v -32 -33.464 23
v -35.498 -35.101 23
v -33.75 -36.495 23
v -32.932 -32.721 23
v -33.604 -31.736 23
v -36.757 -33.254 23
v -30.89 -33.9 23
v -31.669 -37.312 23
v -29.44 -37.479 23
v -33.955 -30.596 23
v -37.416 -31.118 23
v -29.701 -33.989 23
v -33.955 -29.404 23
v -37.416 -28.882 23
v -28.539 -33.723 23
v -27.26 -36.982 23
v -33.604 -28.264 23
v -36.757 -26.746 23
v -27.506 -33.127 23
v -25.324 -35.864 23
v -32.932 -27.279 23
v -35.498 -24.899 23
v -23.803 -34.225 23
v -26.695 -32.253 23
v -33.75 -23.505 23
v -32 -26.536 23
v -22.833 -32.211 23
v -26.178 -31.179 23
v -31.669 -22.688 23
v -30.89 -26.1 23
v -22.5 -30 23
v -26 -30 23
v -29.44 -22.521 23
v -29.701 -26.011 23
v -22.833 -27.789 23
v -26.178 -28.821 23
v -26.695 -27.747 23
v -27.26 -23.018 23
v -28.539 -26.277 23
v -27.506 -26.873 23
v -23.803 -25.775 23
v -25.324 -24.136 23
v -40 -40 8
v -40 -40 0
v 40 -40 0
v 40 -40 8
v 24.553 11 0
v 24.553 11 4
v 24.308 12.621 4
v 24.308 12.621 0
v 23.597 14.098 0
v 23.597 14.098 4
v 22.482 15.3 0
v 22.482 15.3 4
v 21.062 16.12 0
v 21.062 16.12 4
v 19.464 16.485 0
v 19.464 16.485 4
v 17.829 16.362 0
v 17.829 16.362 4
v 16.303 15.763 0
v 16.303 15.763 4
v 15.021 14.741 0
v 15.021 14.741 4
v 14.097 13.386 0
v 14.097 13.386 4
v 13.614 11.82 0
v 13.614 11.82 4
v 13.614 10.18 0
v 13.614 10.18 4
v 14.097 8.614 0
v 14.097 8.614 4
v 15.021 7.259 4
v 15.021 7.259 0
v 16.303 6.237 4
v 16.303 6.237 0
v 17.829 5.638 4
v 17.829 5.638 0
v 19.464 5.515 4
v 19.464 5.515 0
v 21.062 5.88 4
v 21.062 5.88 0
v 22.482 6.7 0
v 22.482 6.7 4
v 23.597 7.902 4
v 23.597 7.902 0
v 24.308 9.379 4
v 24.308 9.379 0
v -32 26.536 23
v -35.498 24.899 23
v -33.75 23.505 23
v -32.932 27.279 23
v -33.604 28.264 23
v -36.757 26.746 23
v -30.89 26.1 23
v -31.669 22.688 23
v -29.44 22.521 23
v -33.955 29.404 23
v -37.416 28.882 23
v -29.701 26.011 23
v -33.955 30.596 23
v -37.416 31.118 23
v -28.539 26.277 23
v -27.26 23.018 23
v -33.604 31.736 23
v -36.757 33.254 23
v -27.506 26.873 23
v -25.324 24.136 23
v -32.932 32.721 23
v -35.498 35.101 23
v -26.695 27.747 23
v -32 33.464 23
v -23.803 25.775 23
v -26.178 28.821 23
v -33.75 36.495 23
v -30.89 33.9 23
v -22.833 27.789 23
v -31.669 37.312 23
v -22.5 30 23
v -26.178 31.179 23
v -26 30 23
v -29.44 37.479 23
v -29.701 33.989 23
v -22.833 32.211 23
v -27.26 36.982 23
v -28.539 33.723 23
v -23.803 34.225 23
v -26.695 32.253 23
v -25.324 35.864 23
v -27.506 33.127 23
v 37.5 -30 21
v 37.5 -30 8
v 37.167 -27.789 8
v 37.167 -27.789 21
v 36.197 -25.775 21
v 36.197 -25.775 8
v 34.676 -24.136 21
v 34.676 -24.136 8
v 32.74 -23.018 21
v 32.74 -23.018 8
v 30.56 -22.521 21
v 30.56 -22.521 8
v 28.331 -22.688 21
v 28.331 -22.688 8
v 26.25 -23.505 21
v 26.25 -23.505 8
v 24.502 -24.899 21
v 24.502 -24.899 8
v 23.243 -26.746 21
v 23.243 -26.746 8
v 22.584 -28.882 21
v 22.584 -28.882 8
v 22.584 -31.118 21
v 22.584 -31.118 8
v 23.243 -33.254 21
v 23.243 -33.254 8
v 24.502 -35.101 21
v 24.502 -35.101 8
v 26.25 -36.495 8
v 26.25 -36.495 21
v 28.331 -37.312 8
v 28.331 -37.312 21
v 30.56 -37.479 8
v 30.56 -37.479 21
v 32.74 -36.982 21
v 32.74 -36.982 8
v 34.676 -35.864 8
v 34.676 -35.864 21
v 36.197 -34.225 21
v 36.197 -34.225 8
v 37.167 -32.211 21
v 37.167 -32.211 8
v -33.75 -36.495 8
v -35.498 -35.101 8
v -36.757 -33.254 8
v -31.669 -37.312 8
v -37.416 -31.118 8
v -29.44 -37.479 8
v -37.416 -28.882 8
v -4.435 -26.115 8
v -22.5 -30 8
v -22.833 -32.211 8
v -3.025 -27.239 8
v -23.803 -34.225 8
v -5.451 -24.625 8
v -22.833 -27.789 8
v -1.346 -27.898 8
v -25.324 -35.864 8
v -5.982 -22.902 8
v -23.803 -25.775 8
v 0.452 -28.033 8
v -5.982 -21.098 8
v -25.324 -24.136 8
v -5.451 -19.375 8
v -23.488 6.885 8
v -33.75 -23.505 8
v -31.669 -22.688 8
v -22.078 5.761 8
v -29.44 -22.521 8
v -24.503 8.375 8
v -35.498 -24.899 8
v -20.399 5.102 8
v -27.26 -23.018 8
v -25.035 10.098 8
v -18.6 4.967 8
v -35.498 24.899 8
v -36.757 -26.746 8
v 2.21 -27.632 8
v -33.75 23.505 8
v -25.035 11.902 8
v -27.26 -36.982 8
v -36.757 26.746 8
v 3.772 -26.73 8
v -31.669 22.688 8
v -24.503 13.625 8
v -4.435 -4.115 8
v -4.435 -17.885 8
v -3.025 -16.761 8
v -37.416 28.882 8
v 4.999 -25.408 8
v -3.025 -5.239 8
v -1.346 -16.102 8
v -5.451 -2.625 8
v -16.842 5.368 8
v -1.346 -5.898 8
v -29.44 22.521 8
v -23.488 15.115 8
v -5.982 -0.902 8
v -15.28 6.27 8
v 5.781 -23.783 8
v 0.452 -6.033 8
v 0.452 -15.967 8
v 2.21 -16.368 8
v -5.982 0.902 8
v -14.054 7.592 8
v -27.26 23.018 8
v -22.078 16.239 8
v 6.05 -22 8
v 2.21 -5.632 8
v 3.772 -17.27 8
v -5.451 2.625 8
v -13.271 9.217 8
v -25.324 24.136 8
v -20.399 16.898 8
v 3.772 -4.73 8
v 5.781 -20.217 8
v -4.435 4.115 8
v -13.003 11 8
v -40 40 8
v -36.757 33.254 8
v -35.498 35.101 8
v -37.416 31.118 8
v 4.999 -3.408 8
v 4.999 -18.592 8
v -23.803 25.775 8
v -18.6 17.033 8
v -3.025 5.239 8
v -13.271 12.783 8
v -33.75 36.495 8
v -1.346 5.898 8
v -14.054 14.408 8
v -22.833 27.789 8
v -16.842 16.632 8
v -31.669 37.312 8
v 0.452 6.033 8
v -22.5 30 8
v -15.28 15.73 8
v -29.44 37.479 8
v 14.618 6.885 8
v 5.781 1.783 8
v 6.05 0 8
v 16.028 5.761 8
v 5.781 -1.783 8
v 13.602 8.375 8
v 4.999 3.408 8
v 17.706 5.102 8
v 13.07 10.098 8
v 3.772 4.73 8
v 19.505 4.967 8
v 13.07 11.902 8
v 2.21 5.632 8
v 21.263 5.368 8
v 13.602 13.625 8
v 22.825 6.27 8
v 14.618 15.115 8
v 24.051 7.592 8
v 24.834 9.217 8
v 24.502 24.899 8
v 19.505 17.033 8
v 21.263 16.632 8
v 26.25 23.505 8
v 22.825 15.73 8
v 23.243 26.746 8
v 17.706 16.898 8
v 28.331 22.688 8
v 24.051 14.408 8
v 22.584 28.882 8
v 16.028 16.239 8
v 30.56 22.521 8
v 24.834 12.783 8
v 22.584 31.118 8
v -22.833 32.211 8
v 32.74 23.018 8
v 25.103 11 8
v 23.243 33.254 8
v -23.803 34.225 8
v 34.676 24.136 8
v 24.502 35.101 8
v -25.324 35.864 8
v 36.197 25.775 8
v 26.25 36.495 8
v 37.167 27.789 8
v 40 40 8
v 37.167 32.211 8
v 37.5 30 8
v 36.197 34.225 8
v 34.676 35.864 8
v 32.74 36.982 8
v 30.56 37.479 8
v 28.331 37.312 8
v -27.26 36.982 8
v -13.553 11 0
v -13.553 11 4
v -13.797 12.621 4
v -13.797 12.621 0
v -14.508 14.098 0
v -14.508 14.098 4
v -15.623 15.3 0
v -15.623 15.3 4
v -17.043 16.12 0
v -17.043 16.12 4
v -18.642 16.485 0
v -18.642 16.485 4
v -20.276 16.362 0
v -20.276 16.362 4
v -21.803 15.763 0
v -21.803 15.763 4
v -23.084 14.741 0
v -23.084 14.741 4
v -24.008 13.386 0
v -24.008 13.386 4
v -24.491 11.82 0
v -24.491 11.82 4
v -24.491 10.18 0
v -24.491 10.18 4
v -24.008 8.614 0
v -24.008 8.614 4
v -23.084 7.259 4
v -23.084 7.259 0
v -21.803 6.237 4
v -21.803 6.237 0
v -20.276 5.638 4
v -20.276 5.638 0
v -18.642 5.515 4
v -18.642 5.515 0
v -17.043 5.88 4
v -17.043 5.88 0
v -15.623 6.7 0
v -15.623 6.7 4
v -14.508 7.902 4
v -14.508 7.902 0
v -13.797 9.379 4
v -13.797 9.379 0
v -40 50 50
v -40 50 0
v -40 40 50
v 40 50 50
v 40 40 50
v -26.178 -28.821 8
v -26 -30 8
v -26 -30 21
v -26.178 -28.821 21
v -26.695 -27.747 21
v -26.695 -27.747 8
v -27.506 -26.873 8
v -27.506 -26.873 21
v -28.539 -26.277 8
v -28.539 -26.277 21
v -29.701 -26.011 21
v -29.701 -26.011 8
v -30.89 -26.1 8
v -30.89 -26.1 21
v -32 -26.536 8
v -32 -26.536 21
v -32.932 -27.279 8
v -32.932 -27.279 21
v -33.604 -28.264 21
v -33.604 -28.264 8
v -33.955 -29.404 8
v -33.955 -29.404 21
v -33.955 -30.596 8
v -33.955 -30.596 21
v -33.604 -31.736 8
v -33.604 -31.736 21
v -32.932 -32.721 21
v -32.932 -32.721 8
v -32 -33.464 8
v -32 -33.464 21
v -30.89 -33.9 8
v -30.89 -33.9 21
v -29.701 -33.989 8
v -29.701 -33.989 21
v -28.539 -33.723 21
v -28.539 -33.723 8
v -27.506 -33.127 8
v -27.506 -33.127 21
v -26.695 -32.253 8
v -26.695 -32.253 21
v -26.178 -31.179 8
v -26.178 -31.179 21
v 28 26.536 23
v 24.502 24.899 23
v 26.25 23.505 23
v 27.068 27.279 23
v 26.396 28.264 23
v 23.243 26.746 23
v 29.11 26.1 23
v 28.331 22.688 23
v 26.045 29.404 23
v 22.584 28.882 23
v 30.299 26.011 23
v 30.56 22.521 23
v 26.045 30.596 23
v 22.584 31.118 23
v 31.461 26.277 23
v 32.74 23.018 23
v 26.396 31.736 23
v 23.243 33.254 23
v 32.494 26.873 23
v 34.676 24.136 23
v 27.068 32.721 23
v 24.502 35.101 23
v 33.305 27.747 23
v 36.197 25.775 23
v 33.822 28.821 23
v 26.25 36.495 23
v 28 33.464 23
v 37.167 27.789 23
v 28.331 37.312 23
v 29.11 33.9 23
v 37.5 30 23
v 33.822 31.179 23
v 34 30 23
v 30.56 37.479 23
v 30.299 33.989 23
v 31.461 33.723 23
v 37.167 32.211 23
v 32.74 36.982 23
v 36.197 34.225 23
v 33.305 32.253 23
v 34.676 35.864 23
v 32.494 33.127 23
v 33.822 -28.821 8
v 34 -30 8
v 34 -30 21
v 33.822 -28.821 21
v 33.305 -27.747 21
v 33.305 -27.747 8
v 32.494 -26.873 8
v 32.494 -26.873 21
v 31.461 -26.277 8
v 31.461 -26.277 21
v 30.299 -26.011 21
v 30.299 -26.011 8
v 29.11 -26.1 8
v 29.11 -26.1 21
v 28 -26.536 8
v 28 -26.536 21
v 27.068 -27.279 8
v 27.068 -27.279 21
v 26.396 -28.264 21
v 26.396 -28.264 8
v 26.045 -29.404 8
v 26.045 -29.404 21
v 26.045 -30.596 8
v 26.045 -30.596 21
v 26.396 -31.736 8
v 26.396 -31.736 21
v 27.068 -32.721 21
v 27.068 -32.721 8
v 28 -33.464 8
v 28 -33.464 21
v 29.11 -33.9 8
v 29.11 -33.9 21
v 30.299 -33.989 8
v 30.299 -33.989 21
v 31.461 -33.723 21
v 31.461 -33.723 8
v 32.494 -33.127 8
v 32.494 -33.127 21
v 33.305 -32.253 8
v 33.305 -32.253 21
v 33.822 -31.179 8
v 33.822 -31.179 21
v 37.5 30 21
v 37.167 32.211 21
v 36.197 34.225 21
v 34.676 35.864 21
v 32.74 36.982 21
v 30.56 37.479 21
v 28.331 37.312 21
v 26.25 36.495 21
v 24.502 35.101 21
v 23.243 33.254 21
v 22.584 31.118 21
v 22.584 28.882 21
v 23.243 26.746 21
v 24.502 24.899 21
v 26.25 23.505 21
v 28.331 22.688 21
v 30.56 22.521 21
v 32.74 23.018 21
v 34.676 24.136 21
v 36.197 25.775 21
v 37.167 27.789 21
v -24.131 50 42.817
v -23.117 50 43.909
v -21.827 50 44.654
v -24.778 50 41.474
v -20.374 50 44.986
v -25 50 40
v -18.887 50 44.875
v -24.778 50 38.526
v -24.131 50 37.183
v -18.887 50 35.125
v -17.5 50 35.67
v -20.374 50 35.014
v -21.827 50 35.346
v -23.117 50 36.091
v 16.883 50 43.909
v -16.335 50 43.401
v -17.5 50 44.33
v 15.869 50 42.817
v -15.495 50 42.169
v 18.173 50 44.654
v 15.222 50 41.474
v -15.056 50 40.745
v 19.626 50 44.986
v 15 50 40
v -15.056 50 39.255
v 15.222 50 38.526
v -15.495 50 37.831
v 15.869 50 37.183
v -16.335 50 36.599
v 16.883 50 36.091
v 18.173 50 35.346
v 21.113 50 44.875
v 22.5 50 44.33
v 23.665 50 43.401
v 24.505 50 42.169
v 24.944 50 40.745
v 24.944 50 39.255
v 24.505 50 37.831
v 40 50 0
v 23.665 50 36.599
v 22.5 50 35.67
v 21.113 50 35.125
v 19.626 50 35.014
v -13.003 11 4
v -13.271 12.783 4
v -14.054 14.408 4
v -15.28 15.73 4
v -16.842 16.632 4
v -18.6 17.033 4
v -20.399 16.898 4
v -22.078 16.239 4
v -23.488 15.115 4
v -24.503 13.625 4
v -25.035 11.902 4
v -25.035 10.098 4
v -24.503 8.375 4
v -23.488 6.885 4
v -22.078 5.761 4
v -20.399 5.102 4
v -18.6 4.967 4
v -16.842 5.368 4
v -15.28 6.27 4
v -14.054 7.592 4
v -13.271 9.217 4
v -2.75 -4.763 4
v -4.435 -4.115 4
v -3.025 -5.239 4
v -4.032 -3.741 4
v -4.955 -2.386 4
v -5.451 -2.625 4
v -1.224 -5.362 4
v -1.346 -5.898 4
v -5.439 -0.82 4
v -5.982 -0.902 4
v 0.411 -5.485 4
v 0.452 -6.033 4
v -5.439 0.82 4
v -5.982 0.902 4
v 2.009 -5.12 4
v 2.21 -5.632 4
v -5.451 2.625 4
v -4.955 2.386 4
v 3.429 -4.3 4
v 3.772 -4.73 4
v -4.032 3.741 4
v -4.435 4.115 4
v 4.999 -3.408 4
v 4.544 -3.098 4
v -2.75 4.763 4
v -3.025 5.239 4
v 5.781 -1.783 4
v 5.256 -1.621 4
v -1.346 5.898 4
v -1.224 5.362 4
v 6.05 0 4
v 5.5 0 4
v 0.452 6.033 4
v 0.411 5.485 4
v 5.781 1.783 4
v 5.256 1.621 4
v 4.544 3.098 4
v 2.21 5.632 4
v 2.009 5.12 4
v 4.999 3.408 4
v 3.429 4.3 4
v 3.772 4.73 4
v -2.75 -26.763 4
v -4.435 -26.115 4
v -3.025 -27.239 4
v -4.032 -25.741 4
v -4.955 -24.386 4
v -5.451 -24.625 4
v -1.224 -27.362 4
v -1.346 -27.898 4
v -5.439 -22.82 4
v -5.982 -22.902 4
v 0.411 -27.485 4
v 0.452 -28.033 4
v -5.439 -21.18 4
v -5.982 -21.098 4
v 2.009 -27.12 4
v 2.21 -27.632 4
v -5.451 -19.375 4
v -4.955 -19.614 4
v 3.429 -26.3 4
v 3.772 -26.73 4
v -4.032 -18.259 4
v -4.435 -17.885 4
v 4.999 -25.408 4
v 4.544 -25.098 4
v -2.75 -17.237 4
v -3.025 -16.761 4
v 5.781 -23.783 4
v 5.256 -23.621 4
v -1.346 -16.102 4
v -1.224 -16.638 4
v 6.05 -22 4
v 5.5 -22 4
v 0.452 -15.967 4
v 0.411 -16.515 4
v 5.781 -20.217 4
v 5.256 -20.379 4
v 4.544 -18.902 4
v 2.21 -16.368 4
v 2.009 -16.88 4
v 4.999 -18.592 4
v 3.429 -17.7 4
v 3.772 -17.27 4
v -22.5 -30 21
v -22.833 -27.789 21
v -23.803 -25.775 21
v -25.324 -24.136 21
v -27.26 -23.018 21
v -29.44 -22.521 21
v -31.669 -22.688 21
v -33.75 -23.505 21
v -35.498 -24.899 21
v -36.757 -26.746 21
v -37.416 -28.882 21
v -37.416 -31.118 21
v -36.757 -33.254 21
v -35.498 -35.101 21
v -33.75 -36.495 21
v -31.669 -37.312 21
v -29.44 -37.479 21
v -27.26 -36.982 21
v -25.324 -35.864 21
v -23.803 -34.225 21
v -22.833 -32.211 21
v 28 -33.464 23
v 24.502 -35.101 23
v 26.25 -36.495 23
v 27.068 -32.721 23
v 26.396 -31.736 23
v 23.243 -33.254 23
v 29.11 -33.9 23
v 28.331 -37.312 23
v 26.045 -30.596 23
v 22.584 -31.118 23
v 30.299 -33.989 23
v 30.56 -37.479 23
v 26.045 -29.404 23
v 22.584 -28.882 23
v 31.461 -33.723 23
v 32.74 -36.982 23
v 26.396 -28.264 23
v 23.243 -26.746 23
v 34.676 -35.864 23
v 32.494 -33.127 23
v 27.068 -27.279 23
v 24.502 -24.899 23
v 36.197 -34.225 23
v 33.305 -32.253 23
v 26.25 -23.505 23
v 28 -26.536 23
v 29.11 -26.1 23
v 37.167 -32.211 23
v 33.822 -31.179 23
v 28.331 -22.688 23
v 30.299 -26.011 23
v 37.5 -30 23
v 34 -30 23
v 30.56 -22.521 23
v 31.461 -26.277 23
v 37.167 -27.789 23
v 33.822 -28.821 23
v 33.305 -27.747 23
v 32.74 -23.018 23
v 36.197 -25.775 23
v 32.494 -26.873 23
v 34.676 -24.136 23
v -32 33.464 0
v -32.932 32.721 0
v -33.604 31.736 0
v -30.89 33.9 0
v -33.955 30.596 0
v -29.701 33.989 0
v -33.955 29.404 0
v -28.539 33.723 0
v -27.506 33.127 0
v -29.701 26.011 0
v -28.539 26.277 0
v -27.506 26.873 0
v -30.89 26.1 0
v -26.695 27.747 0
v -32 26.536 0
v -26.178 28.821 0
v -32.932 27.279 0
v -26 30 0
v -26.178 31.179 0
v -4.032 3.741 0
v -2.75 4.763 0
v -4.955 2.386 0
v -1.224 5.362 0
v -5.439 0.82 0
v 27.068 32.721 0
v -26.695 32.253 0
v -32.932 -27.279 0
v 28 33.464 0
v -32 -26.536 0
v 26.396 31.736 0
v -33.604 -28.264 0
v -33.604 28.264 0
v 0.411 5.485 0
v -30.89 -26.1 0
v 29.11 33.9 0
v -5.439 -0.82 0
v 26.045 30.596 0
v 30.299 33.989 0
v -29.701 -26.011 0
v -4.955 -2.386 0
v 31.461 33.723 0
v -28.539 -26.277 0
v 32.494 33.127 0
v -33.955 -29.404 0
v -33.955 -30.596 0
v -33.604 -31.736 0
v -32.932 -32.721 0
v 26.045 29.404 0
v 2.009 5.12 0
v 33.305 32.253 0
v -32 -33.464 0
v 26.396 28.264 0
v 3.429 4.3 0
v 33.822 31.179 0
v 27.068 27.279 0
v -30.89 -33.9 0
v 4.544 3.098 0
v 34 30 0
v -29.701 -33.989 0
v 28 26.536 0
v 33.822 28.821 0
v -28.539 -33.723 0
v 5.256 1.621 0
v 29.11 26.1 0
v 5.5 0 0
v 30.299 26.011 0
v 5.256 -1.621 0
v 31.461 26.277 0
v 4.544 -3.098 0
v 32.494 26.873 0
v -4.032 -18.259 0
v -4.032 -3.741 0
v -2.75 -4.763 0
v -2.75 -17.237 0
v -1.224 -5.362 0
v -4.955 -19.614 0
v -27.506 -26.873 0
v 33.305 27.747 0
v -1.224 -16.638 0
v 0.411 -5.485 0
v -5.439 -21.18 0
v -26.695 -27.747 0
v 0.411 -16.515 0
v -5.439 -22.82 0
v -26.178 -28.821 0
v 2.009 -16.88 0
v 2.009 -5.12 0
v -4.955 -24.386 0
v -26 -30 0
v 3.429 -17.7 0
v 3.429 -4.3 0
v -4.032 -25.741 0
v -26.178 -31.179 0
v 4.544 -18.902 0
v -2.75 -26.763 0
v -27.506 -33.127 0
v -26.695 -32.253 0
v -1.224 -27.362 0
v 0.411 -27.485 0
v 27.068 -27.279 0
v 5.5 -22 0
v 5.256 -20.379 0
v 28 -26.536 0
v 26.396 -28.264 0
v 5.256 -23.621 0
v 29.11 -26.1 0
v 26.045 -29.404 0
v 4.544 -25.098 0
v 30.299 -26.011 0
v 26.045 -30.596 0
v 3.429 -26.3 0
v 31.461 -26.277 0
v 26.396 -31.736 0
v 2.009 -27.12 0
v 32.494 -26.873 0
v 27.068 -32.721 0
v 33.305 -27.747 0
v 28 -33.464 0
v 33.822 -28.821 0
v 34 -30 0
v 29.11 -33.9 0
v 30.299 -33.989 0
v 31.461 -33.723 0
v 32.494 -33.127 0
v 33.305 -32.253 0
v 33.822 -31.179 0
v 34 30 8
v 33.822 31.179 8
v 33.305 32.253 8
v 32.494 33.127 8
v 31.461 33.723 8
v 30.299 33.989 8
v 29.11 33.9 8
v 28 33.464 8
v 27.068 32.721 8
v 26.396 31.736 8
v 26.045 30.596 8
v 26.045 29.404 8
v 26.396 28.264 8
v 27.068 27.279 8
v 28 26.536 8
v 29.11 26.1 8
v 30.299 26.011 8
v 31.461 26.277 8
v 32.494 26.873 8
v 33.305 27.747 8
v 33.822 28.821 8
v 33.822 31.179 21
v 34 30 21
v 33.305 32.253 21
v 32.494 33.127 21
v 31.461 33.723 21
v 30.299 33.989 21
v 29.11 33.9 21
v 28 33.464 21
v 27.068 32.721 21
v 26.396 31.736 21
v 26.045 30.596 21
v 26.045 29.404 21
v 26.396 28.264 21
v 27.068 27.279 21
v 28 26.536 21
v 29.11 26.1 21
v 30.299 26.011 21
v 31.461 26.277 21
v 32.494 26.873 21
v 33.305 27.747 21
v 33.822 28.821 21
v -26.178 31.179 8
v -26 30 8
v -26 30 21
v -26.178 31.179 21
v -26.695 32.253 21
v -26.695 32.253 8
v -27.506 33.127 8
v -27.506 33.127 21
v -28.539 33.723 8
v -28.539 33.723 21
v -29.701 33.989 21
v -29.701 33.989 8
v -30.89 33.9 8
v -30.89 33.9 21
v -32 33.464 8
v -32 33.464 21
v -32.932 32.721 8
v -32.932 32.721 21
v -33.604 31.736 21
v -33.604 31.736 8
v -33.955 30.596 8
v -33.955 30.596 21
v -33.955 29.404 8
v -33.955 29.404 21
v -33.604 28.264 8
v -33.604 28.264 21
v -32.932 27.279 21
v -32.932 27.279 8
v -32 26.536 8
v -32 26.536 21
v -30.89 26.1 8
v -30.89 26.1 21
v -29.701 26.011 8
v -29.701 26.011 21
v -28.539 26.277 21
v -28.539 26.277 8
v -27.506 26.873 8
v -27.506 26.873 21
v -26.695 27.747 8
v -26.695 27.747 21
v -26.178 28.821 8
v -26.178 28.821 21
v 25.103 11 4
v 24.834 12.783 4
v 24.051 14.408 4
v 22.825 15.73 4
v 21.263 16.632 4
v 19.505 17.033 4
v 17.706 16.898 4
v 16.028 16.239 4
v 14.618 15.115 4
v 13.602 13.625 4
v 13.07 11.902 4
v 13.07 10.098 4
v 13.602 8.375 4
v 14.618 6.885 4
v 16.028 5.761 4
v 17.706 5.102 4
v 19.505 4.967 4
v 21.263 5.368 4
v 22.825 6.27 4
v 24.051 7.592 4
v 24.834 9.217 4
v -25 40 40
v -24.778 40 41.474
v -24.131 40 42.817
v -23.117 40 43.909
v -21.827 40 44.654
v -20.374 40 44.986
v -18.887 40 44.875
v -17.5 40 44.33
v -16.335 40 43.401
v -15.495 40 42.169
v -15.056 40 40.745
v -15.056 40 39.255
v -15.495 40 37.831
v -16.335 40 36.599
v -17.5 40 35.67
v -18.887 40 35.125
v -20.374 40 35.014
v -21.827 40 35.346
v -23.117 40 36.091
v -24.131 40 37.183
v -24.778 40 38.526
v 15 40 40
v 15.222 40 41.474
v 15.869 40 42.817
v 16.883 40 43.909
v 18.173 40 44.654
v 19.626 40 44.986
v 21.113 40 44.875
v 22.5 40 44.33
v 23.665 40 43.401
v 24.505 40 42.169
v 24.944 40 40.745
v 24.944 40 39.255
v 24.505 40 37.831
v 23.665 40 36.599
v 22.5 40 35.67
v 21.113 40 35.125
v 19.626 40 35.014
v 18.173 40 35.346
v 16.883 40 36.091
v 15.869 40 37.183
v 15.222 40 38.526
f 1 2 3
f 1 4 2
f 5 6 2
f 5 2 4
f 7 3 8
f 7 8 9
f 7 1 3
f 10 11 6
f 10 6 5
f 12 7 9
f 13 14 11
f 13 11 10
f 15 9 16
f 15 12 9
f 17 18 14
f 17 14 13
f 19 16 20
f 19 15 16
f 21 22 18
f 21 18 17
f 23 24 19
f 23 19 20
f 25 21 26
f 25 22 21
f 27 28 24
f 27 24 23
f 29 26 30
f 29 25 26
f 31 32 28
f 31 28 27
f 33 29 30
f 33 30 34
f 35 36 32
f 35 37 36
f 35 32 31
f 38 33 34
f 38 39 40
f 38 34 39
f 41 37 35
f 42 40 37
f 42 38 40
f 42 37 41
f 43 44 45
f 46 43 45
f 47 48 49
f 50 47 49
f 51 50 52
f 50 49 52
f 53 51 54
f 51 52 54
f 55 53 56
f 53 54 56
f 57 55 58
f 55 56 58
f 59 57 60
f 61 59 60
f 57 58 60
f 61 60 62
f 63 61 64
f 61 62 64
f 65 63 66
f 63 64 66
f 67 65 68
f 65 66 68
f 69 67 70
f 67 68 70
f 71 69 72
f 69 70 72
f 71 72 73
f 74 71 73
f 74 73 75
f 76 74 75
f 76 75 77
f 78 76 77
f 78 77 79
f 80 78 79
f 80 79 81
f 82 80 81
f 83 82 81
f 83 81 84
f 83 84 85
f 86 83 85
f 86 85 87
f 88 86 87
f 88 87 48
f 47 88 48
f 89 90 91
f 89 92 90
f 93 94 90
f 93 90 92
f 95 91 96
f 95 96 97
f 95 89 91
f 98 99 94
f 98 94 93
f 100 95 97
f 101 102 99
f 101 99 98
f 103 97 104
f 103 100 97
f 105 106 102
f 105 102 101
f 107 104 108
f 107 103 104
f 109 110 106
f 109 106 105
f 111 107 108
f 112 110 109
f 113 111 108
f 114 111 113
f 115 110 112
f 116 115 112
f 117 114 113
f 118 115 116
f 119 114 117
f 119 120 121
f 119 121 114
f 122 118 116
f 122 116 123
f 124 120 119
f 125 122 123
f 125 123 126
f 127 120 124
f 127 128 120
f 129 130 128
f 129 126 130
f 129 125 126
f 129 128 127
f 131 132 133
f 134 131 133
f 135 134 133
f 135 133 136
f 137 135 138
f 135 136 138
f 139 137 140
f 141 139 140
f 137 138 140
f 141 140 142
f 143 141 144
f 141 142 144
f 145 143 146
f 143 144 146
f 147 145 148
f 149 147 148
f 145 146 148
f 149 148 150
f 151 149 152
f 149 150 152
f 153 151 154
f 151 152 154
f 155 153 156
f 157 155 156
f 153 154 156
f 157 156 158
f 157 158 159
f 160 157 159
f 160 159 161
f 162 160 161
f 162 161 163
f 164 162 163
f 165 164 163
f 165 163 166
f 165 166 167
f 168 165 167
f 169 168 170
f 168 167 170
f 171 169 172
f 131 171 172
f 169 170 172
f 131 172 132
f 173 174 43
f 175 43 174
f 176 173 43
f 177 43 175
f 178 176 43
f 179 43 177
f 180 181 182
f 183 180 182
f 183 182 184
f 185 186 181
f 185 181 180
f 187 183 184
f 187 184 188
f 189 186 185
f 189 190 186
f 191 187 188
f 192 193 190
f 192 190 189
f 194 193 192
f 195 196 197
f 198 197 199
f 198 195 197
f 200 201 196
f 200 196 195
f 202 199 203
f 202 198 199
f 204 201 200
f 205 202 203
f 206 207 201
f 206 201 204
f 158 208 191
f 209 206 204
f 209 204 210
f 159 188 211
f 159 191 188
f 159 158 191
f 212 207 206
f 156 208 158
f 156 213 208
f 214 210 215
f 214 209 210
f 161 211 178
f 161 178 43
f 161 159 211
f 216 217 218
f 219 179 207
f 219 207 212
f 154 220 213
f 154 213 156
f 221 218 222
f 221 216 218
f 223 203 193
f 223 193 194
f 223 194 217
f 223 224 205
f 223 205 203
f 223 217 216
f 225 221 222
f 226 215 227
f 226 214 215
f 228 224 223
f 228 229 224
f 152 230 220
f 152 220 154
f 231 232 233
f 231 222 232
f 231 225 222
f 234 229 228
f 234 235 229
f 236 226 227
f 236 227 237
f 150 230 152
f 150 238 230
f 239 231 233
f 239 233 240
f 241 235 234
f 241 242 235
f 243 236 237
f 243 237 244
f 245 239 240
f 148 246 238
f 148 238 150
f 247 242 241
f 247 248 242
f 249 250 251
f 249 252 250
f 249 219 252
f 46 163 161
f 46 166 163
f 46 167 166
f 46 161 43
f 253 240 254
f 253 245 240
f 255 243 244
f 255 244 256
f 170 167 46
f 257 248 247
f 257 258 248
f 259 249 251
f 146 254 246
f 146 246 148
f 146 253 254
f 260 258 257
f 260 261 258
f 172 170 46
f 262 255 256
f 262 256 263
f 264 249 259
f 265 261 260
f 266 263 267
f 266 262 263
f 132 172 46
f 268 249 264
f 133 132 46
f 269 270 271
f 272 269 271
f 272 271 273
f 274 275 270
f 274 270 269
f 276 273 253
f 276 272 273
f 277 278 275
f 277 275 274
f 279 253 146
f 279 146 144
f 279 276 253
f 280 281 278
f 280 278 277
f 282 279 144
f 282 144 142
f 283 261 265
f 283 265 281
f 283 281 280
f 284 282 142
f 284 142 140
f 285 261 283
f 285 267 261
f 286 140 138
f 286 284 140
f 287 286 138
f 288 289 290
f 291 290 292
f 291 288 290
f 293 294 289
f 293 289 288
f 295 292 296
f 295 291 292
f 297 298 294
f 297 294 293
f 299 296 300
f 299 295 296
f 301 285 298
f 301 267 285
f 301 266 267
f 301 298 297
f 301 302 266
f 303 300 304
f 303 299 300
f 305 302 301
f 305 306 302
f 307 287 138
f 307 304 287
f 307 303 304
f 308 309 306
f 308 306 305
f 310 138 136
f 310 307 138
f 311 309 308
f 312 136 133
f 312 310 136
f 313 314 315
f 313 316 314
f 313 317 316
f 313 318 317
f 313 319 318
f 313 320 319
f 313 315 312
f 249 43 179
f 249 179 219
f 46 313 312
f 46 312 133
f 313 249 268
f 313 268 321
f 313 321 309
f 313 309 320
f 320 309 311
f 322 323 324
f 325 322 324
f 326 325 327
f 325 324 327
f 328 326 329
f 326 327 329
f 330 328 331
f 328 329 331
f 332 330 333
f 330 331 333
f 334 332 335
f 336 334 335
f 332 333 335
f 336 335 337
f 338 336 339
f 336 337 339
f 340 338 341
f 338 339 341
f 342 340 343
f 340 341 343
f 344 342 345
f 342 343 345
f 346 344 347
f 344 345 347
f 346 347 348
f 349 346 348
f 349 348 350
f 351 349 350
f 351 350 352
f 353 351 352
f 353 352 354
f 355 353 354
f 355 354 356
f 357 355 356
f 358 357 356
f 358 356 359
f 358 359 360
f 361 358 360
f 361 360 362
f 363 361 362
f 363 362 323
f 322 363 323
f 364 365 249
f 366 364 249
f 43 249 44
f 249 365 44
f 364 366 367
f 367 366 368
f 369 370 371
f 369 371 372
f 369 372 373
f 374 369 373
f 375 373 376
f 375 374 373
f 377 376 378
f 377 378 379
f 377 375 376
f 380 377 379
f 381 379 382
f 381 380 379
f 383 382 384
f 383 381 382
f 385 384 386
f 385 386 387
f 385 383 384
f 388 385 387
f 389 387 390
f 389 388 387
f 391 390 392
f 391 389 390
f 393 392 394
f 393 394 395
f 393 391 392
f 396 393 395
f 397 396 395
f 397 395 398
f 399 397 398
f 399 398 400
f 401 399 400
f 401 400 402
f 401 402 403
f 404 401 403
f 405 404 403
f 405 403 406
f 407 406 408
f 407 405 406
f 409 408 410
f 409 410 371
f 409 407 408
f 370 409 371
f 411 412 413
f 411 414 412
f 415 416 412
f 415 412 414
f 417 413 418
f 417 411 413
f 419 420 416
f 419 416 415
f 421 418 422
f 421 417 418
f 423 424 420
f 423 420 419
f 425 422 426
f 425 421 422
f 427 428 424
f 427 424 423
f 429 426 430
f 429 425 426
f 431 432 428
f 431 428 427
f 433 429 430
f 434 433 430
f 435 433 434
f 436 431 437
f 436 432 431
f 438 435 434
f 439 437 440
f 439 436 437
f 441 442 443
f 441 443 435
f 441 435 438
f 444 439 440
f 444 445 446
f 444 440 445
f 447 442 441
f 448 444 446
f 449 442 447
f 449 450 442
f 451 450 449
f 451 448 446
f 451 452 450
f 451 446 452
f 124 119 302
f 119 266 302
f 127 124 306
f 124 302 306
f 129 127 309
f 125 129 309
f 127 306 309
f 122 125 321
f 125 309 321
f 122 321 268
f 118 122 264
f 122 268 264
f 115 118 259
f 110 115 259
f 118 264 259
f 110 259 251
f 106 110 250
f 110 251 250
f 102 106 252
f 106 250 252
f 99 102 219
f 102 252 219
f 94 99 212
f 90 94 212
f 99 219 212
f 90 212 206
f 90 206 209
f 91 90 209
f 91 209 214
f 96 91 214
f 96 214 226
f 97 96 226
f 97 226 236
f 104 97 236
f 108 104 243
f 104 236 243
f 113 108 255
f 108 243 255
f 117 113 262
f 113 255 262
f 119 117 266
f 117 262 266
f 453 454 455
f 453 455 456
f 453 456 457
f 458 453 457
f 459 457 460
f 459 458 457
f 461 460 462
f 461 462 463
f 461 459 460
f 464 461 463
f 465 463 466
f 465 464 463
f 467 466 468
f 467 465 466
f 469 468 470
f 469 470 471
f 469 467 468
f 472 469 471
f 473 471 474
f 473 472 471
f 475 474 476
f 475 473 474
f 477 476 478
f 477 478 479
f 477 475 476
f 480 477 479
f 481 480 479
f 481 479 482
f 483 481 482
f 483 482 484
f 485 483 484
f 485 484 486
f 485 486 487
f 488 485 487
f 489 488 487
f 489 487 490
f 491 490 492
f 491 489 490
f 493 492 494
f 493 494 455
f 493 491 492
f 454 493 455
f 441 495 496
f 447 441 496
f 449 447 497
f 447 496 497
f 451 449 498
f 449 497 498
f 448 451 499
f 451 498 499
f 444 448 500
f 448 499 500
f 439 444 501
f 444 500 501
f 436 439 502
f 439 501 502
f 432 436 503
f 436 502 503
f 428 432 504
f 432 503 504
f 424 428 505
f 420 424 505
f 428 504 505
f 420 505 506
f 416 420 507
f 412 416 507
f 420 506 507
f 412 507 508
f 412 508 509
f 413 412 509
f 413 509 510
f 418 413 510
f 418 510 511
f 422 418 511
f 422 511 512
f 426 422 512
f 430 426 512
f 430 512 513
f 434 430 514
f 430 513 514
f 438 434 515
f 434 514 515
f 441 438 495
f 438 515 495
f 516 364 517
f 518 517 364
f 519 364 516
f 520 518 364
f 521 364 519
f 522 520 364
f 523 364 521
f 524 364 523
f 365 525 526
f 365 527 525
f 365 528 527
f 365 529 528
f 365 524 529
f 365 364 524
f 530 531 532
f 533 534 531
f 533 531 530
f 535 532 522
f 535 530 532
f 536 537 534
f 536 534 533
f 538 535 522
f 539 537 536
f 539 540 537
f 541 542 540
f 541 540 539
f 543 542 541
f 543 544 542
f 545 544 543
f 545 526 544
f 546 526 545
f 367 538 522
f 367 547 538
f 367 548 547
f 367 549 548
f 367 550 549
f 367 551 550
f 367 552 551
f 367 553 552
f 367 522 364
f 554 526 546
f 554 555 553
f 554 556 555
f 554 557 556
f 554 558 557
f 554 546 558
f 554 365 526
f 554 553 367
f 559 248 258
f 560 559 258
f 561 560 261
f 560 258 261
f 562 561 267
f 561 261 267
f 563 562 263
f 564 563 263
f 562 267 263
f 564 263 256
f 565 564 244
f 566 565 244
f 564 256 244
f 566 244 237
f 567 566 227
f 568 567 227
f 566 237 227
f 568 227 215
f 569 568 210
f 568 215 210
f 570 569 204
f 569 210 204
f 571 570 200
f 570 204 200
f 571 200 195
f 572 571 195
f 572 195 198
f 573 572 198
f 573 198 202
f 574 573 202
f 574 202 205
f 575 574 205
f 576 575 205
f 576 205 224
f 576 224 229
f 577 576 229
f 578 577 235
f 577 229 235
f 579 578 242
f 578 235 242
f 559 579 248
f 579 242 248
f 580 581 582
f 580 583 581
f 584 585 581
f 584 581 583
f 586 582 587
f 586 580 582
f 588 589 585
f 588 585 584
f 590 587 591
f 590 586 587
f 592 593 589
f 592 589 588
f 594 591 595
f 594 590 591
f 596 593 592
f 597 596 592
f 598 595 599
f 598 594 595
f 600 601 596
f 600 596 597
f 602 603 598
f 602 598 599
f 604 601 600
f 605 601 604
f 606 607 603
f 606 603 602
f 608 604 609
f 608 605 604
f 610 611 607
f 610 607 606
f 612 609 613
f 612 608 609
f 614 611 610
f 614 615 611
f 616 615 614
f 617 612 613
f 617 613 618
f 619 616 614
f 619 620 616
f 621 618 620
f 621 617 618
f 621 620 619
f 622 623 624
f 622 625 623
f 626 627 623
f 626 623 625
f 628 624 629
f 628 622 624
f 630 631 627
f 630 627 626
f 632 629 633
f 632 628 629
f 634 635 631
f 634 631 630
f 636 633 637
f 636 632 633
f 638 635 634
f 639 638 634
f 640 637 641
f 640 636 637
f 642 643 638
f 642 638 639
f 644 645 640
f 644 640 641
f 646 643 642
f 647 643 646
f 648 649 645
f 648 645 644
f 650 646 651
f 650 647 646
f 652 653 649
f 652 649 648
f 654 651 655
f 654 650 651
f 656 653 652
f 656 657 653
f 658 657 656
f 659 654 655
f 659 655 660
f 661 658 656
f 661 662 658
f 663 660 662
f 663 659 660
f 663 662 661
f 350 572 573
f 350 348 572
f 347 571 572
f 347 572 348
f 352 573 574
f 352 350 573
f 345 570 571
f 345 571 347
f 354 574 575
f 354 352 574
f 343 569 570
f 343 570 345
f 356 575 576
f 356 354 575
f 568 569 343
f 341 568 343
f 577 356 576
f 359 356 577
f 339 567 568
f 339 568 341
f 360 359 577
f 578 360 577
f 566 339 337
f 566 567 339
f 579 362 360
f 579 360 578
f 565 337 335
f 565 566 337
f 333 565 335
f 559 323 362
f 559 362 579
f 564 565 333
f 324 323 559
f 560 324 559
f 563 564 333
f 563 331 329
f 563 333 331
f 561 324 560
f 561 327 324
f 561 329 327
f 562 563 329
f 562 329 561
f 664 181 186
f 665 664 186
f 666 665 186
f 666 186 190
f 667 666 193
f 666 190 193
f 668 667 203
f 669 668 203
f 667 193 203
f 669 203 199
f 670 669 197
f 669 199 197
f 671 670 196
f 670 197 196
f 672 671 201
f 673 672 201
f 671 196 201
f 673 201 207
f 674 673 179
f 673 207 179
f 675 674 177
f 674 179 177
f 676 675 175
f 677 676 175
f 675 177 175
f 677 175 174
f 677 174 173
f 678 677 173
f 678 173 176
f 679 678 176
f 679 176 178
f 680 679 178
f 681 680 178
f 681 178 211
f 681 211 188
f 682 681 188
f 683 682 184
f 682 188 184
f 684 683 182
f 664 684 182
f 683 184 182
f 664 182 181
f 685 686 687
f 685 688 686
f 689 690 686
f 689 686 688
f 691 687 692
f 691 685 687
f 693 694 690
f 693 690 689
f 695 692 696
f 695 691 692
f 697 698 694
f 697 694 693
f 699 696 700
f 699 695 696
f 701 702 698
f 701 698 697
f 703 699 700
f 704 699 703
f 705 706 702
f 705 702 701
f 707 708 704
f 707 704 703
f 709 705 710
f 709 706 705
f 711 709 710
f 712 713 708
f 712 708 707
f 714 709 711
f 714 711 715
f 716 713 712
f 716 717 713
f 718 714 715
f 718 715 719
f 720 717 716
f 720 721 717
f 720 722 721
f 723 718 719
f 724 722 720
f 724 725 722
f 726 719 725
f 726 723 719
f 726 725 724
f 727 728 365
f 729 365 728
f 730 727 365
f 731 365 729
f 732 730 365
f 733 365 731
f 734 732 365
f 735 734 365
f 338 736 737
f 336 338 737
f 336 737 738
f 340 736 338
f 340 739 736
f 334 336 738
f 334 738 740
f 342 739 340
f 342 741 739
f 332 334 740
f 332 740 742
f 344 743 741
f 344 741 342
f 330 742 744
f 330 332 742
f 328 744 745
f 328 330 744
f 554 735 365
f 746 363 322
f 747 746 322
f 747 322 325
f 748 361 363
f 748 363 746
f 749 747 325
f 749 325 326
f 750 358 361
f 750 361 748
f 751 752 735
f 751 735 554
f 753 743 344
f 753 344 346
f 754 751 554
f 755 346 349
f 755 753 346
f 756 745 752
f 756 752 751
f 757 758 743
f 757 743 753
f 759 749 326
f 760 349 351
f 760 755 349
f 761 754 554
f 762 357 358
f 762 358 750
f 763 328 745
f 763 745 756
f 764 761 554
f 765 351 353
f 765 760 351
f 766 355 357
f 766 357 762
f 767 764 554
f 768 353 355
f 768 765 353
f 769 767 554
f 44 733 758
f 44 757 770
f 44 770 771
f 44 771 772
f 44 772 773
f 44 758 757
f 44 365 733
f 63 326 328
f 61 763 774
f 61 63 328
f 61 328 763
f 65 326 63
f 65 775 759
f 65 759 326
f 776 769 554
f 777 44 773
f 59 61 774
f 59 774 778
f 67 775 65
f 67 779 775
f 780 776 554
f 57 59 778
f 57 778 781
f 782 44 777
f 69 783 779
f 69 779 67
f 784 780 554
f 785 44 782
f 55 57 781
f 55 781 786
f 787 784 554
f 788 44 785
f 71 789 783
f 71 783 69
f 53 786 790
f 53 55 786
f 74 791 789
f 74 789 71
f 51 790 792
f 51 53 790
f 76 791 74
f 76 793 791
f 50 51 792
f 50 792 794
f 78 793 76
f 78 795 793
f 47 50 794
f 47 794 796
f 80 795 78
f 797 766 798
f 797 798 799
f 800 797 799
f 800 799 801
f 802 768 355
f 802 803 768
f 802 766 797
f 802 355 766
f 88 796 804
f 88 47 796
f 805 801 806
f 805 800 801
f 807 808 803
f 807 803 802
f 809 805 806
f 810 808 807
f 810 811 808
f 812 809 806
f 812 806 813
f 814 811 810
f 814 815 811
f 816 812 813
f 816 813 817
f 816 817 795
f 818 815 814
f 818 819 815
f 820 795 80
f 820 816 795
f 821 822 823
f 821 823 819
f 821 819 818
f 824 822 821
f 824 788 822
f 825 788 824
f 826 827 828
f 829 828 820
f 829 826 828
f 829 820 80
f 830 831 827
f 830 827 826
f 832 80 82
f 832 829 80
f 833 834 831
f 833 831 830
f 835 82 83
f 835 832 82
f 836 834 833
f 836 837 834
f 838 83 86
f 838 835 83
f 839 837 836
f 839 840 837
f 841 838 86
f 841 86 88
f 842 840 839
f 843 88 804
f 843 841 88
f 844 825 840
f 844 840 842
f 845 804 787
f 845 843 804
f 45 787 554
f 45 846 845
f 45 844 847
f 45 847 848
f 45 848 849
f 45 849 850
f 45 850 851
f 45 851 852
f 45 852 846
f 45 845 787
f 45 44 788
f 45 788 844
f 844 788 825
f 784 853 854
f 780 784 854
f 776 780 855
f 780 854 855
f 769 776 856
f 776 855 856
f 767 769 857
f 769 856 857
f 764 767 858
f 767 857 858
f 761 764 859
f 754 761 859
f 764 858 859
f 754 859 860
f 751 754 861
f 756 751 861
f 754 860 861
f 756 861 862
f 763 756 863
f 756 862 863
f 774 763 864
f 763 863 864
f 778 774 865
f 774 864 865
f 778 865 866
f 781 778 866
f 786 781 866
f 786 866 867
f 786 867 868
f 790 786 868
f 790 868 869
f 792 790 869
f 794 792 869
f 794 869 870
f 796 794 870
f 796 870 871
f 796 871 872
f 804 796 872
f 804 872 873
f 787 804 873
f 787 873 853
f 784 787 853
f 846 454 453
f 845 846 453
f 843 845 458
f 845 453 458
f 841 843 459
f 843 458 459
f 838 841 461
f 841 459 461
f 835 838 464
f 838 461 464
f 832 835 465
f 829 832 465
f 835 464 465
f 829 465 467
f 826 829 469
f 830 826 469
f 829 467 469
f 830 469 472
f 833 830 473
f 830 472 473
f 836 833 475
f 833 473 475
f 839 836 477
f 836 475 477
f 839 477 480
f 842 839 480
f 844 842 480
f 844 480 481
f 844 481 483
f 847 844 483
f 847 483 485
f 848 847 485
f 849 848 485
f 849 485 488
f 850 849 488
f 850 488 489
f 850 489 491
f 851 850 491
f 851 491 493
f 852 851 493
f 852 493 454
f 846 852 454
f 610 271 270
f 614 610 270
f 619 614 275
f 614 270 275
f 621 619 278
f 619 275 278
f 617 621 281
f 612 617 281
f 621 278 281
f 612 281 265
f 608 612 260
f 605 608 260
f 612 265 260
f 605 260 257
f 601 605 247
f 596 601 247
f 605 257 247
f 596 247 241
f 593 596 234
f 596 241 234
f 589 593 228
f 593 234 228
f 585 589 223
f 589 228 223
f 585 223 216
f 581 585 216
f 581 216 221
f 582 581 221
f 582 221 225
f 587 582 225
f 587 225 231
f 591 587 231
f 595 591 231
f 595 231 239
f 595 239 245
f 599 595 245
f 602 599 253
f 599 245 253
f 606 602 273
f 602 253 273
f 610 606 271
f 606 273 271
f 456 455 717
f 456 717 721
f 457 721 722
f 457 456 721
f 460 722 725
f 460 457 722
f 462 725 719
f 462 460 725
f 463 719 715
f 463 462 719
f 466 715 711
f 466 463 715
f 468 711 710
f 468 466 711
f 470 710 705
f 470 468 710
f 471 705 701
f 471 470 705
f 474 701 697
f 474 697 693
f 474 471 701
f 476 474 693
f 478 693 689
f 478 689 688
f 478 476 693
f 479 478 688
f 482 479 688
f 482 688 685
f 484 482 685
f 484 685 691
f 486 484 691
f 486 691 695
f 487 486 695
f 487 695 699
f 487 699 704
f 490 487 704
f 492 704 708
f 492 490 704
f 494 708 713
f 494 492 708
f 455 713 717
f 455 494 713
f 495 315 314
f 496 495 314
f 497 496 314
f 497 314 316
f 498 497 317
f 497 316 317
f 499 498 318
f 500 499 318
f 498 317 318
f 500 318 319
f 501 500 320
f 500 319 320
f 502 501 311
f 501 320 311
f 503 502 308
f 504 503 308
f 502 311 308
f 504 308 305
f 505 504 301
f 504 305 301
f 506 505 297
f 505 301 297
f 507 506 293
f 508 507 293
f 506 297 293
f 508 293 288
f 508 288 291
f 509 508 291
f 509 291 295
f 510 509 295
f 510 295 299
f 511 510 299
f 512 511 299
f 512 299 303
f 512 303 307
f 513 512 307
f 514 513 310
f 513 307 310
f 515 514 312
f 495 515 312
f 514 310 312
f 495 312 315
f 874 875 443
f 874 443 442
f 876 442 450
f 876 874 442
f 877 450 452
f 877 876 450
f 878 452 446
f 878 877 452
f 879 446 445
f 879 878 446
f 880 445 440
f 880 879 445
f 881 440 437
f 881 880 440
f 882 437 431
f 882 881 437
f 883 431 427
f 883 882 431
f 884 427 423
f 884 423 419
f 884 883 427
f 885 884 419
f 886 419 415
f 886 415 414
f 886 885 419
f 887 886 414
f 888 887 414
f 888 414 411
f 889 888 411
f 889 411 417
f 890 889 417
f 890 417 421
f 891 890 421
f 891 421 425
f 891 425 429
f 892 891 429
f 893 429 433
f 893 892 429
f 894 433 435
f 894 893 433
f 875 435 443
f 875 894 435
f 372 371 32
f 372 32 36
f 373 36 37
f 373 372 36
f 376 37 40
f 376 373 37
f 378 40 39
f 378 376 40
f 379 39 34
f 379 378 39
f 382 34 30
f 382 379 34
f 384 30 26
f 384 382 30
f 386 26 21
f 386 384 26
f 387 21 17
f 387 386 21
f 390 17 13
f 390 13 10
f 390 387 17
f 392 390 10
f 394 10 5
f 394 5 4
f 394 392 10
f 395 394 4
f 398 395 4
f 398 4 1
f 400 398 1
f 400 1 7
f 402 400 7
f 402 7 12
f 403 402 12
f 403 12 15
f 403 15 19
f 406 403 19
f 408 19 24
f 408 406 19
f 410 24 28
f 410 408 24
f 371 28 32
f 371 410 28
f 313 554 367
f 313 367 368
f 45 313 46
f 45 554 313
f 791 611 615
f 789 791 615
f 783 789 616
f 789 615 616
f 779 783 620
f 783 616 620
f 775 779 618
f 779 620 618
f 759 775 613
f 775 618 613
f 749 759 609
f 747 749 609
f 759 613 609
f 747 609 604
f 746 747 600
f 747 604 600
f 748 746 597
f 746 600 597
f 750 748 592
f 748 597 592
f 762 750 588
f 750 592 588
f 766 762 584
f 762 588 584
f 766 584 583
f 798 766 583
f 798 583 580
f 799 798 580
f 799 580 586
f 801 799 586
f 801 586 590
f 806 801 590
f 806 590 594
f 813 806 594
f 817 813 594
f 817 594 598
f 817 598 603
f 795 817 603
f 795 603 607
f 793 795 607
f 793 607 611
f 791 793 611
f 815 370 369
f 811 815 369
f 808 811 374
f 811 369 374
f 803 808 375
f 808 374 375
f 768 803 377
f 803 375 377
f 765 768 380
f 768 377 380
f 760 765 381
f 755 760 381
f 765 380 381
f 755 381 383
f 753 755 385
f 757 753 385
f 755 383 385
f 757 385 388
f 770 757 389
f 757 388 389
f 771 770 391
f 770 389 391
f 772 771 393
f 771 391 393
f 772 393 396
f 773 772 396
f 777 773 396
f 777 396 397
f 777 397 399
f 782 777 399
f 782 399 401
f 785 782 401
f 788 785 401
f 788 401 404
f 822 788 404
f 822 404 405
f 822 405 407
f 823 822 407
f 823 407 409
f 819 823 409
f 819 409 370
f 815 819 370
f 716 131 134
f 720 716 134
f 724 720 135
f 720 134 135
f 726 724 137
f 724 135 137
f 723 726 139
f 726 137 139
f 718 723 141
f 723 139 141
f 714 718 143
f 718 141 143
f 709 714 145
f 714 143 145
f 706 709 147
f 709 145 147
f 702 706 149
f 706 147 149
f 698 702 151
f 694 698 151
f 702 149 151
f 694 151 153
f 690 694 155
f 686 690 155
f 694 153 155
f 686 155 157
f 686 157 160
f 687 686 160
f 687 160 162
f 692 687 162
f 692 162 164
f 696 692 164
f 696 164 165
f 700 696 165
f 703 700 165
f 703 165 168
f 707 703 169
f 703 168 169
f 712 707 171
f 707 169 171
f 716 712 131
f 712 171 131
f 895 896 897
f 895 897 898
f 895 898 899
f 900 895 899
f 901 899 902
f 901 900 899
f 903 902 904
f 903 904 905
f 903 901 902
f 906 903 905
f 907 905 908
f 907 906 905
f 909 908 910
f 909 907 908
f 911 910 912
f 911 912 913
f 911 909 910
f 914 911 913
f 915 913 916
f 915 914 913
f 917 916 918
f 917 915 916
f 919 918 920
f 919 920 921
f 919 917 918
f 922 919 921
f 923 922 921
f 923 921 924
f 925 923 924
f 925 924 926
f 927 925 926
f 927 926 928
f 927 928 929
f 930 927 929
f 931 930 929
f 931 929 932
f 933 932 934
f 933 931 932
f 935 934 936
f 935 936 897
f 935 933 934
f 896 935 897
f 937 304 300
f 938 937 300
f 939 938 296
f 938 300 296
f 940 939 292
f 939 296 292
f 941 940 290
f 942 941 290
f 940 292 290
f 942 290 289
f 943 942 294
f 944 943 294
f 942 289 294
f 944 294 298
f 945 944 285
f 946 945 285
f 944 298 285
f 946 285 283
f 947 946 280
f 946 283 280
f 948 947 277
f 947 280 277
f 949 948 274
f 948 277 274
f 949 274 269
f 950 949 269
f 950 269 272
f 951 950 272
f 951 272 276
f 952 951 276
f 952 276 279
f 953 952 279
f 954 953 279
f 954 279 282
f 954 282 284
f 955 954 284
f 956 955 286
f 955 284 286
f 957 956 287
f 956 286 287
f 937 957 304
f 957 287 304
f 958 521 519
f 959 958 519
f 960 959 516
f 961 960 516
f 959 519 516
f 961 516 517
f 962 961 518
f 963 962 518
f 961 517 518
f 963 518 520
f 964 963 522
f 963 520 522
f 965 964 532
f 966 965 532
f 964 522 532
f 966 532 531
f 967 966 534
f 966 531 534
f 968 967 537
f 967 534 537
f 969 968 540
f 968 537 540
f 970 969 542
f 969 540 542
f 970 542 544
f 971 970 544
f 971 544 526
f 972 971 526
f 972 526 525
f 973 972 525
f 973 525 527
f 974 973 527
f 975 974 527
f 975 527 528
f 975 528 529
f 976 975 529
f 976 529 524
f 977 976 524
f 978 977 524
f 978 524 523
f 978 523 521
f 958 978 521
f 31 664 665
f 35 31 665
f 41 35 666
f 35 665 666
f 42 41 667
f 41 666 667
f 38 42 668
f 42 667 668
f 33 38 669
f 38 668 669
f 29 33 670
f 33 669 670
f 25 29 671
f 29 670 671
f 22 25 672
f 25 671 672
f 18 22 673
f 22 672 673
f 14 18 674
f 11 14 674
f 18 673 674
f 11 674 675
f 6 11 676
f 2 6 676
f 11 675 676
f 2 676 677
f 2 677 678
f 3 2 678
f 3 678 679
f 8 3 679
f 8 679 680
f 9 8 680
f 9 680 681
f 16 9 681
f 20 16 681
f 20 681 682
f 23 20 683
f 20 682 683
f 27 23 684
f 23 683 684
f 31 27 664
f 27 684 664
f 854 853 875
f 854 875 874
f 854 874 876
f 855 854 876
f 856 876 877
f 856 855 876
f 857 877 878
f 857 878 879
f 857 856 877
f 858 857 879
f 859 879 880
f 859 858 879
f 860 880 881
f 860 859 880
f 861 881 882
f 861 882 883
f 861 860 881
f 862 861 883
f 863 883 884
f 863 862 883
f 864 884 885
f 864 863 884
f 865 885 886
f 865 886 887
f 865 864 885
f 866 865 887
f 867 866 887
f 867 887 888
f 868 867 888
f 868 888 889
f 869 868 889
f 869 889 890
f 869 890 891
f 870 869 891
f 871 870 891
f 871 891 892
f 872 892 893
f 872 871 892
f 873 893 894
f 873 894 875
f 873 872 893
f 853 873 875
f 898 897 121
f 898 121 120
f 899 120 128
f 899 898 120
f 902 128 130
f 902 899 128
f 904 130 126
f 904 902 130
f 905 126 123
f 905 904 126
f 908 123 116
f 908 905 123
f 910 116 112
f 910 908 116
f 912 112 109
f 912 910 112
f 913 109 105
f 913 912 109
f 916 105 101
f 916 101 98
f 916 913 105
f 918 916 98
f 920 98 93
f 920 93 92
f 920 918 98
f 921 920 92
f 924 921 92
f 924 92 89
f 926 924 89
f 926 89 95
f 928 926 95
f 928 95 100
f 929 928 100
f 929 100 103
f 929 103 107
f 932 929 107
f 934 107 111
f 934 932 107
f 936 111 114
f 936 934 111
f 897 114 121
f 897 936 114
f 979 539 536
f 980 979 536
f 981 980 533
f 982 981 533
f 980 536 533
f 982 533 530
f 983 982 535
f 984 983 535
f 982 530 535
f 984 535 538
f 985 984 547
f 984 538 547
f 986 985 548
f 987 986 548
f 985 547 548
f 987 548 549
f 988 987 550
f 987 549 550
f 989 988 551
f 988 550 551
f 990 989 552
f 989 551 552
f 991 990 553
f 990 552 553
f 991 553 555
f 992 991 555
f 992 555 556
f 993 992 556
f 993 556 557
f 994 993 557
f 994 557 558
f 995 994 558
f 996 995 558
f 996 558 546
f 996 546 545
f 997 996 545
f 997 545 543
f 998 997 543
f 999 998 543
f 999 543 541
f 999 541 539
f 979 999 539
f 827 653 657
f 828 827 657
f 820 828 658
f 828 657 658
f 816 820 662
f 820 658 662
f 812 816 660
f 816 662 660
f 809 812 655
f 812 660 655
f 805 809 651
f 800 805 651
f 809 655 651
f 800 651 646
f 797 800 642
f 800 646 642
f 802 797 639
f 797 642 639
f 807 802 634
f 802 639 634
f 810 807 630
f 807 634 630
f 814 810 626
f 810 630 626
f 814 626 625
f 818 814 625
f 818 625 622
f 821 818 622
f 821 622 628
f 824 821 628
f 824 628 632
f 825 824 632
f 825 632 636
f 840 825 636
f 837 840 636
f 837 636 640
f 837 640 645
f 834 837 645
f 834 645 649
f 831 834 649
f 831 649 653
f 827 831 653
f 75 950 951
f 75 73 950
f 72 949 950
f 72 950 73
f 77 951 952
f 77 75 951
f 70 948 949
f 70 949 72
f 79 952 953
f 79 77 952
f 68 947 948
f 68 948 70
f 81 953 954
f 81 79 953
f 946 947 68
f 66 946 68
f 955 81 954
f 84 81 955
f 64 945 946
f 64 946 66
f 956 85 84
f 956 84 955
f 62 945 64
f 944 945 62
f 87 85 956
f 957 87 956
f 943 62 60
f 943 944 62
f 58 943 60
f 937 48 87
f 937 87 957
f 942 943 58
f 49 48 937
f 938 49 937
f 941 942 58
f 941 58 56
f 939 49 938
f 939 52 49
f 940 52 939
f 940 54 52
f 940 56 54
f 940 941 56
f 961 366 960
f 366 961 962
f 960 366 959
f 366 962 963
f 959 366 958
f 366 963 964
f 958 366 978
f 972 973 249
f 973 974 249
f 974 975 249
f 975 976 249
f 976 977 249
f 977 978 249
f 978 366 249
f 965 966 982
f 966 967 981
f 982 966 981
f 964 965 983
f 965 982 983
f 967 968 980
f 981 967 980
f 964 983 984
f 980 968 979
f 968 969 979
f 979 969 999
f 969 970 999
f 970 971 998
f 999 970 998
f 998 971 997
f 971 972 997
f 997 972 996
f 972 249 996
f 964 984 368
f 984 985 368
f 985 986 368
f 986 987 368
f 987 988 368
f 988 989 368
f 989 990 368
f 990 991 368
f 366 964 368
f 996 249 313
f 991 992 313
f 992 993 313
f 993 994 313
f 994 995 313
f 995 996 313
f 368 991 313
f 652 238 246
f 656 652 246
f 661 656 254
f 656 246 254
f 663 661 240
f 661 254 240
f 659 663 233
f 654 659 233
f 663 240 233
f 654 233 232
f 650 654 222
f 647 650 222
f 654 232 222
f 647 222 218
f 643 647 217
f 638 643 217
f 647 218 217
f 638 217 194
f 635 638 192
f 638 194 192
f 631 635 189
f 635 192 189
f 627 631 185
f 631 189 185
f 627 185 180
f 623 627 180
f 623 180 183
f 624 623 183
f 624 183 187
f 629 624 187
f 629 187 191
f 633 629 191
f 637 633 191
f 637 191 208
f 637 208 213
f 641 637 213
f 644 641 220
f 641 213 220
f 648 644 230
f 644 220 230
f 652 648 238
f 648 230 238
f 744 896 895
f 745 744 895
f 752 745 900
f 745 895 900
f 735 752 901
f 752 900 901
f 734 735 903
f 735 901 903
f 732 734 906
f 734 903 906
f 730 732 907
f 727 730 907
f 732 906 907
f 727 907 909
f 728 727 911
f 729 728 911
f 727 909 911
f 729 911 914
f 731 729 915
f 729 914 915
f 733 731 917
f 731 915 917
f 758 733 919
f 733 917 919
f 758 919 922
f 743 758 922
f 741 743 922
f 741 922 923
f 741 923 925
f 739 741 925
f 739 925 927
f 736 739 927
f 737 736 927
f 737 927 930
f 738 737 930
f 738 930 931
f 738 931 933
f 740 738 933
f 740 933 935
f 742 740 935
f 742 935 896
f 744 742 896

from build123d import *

# Parameters (mm, degrees)
F0_W      = 80
F0_H      = 80
F1_DEPTH  = 8
F2_R      = 6.05
F2_R_2    = 5.5
F3_DEPTH  = 4
F4_DEPTH  = 25
F5_DEPTH  = 25
F6_R      = 7.5
F6_R_2    = 4
F7_DEPTH  = 13
F8_DEPTH  = 25
F9_W      = 80
F9_H      = 10
F10_DEPTH = 50
F11_R     = 5
F12_DEPTH = 25
F13_DEPTH = 2


with BuildPart() as f1:
    # F0 (on Top) → F1 (new body)
    with BuildSketch(Plane.XY):
        Rectangle(F0_W, F0_H)
    extrude(amount=F1_DEPTH)

    # F2 (on face) → F3 (cut)
    with BuildSketch(Plane.XY.offset(8)):
        with Locations((-19.0525588833, 11)):
            Circle(F2_R)
        with Locations((-19.0525588833, 11)):
            Circle(F2_R_2, mode=Mode.SUBTRACT)
        with Locations((19.0525588833, 11)):
            Circle(F2_R)
        with Locations((19.0525588833, 11)):
            Circle(F2_R_2, mode=Mode.SUBTRACT)
        Circle(F2_R)
        Circle(F2_R_2, mode=Mode.SUBTRACT)
        with Locations((0, -22)):
            Circle(F2_R)
        with Locations((0, -22)):
            Circle(F2_R_2, mode=Mode.SUBTRACT)
    extrude(amount=-F3_DEPTH, mode=Mode.SUBTRACT)

    # F4 (cut): faces of the model
    f4_faces = [f1.faces().sort_by_distance(p)[0] for p in [
        (-19.0525588833, 11, 8),
        (19.0525588833, 11, 8),
        (0, -22, 8),
    ]]
    extrude(f4_faces, amount=-F4_DEPTH, mode=Mode.SUBTRACT)

    # F5 (cut): a face of the model
    f5_faces = [f1.faces().sort_by_distance(p)[0] for p in [
        (0, 0, 8),
    ]]
    extrude(f5_faces, amount=-F5_DEPTH, mode=Mode.SUBTRACT)

    # F6 (on face) → F7 (join)
    with BuildSketch(Plane.XY.offset(8)):
        with Locations((-30, 30)):
            Circle(F6_R)
        with Locations((-30, 30)):
            Circle(F6_R_2, mode=Mode.SUBTRACT)
        with Locations((30, 30)):
            Circle(F6_R)
        with Locations((30, 30)):
            Circle(F6_R_2, mode=Mode.SUBTRACT)
        with Locations((30, -30)):
            Circle(F6_R)
        with Locations((30, -30)):
            Circle(F6_R_2, mode=Mode.SUBTRACT)
        with Locations((-30, -30)):
            Circle(F6_R)
        with Locations((-30, -30)):
            Circle(F6_R_2, mode=Mode.SUBTRACT)
    extrude(amount=F7_DEPTH)

    # F8 (cut): faces of the model
    f8_faces = [f1.faces().sort_by_distance(p)[0] for p in [
        (-30, 30, 8),
        (30, 30, 8),
        (-30, -30, 8),
        (30, -30, 8),
    ]]
    extrude(f8_faces, amount=-F8_DEPTH, mode=Mode.SUBTRACT)

    # F9 (on face) → F10 (join)
    with BuildSketch(Plane(origin=(0, 0, 0), x_dir=(1, 0, 0), z_dir=(0, 0, -1))):
        with Locations((0, -45)):
            Rectangle(F9_W, F9_H)
    extrude(amount=-F10_DEPTH)

    # F11 (on face) → F12 (cut)
    with BuildSketch(Plane(origin=(0, 50, 0), x_dir=(-1, 0, 0), z_dir=(0, 1, 0))):
        with Locations((-20, 40)):
            Circle(F11_R)
        with Locations((20, 40)):
            Circle(F11_R)
    extrude(amount=-F12_DEPTH, mode=Mode.SUBTRACT)

    # F13 (add): faces of the model
    f13_faces = [f1.faces().sort_by_distance(p)[0] for p in [
        (-37.2878679656, 30, 21),
        (-37.2878679656, -30, 21),
        (22.7121320344, -30, 21),
        (22.7121320344, 30, 21),
    ]]
    extrude(f13_faces, amount=F13_DEPTH)


solid = f1.part
